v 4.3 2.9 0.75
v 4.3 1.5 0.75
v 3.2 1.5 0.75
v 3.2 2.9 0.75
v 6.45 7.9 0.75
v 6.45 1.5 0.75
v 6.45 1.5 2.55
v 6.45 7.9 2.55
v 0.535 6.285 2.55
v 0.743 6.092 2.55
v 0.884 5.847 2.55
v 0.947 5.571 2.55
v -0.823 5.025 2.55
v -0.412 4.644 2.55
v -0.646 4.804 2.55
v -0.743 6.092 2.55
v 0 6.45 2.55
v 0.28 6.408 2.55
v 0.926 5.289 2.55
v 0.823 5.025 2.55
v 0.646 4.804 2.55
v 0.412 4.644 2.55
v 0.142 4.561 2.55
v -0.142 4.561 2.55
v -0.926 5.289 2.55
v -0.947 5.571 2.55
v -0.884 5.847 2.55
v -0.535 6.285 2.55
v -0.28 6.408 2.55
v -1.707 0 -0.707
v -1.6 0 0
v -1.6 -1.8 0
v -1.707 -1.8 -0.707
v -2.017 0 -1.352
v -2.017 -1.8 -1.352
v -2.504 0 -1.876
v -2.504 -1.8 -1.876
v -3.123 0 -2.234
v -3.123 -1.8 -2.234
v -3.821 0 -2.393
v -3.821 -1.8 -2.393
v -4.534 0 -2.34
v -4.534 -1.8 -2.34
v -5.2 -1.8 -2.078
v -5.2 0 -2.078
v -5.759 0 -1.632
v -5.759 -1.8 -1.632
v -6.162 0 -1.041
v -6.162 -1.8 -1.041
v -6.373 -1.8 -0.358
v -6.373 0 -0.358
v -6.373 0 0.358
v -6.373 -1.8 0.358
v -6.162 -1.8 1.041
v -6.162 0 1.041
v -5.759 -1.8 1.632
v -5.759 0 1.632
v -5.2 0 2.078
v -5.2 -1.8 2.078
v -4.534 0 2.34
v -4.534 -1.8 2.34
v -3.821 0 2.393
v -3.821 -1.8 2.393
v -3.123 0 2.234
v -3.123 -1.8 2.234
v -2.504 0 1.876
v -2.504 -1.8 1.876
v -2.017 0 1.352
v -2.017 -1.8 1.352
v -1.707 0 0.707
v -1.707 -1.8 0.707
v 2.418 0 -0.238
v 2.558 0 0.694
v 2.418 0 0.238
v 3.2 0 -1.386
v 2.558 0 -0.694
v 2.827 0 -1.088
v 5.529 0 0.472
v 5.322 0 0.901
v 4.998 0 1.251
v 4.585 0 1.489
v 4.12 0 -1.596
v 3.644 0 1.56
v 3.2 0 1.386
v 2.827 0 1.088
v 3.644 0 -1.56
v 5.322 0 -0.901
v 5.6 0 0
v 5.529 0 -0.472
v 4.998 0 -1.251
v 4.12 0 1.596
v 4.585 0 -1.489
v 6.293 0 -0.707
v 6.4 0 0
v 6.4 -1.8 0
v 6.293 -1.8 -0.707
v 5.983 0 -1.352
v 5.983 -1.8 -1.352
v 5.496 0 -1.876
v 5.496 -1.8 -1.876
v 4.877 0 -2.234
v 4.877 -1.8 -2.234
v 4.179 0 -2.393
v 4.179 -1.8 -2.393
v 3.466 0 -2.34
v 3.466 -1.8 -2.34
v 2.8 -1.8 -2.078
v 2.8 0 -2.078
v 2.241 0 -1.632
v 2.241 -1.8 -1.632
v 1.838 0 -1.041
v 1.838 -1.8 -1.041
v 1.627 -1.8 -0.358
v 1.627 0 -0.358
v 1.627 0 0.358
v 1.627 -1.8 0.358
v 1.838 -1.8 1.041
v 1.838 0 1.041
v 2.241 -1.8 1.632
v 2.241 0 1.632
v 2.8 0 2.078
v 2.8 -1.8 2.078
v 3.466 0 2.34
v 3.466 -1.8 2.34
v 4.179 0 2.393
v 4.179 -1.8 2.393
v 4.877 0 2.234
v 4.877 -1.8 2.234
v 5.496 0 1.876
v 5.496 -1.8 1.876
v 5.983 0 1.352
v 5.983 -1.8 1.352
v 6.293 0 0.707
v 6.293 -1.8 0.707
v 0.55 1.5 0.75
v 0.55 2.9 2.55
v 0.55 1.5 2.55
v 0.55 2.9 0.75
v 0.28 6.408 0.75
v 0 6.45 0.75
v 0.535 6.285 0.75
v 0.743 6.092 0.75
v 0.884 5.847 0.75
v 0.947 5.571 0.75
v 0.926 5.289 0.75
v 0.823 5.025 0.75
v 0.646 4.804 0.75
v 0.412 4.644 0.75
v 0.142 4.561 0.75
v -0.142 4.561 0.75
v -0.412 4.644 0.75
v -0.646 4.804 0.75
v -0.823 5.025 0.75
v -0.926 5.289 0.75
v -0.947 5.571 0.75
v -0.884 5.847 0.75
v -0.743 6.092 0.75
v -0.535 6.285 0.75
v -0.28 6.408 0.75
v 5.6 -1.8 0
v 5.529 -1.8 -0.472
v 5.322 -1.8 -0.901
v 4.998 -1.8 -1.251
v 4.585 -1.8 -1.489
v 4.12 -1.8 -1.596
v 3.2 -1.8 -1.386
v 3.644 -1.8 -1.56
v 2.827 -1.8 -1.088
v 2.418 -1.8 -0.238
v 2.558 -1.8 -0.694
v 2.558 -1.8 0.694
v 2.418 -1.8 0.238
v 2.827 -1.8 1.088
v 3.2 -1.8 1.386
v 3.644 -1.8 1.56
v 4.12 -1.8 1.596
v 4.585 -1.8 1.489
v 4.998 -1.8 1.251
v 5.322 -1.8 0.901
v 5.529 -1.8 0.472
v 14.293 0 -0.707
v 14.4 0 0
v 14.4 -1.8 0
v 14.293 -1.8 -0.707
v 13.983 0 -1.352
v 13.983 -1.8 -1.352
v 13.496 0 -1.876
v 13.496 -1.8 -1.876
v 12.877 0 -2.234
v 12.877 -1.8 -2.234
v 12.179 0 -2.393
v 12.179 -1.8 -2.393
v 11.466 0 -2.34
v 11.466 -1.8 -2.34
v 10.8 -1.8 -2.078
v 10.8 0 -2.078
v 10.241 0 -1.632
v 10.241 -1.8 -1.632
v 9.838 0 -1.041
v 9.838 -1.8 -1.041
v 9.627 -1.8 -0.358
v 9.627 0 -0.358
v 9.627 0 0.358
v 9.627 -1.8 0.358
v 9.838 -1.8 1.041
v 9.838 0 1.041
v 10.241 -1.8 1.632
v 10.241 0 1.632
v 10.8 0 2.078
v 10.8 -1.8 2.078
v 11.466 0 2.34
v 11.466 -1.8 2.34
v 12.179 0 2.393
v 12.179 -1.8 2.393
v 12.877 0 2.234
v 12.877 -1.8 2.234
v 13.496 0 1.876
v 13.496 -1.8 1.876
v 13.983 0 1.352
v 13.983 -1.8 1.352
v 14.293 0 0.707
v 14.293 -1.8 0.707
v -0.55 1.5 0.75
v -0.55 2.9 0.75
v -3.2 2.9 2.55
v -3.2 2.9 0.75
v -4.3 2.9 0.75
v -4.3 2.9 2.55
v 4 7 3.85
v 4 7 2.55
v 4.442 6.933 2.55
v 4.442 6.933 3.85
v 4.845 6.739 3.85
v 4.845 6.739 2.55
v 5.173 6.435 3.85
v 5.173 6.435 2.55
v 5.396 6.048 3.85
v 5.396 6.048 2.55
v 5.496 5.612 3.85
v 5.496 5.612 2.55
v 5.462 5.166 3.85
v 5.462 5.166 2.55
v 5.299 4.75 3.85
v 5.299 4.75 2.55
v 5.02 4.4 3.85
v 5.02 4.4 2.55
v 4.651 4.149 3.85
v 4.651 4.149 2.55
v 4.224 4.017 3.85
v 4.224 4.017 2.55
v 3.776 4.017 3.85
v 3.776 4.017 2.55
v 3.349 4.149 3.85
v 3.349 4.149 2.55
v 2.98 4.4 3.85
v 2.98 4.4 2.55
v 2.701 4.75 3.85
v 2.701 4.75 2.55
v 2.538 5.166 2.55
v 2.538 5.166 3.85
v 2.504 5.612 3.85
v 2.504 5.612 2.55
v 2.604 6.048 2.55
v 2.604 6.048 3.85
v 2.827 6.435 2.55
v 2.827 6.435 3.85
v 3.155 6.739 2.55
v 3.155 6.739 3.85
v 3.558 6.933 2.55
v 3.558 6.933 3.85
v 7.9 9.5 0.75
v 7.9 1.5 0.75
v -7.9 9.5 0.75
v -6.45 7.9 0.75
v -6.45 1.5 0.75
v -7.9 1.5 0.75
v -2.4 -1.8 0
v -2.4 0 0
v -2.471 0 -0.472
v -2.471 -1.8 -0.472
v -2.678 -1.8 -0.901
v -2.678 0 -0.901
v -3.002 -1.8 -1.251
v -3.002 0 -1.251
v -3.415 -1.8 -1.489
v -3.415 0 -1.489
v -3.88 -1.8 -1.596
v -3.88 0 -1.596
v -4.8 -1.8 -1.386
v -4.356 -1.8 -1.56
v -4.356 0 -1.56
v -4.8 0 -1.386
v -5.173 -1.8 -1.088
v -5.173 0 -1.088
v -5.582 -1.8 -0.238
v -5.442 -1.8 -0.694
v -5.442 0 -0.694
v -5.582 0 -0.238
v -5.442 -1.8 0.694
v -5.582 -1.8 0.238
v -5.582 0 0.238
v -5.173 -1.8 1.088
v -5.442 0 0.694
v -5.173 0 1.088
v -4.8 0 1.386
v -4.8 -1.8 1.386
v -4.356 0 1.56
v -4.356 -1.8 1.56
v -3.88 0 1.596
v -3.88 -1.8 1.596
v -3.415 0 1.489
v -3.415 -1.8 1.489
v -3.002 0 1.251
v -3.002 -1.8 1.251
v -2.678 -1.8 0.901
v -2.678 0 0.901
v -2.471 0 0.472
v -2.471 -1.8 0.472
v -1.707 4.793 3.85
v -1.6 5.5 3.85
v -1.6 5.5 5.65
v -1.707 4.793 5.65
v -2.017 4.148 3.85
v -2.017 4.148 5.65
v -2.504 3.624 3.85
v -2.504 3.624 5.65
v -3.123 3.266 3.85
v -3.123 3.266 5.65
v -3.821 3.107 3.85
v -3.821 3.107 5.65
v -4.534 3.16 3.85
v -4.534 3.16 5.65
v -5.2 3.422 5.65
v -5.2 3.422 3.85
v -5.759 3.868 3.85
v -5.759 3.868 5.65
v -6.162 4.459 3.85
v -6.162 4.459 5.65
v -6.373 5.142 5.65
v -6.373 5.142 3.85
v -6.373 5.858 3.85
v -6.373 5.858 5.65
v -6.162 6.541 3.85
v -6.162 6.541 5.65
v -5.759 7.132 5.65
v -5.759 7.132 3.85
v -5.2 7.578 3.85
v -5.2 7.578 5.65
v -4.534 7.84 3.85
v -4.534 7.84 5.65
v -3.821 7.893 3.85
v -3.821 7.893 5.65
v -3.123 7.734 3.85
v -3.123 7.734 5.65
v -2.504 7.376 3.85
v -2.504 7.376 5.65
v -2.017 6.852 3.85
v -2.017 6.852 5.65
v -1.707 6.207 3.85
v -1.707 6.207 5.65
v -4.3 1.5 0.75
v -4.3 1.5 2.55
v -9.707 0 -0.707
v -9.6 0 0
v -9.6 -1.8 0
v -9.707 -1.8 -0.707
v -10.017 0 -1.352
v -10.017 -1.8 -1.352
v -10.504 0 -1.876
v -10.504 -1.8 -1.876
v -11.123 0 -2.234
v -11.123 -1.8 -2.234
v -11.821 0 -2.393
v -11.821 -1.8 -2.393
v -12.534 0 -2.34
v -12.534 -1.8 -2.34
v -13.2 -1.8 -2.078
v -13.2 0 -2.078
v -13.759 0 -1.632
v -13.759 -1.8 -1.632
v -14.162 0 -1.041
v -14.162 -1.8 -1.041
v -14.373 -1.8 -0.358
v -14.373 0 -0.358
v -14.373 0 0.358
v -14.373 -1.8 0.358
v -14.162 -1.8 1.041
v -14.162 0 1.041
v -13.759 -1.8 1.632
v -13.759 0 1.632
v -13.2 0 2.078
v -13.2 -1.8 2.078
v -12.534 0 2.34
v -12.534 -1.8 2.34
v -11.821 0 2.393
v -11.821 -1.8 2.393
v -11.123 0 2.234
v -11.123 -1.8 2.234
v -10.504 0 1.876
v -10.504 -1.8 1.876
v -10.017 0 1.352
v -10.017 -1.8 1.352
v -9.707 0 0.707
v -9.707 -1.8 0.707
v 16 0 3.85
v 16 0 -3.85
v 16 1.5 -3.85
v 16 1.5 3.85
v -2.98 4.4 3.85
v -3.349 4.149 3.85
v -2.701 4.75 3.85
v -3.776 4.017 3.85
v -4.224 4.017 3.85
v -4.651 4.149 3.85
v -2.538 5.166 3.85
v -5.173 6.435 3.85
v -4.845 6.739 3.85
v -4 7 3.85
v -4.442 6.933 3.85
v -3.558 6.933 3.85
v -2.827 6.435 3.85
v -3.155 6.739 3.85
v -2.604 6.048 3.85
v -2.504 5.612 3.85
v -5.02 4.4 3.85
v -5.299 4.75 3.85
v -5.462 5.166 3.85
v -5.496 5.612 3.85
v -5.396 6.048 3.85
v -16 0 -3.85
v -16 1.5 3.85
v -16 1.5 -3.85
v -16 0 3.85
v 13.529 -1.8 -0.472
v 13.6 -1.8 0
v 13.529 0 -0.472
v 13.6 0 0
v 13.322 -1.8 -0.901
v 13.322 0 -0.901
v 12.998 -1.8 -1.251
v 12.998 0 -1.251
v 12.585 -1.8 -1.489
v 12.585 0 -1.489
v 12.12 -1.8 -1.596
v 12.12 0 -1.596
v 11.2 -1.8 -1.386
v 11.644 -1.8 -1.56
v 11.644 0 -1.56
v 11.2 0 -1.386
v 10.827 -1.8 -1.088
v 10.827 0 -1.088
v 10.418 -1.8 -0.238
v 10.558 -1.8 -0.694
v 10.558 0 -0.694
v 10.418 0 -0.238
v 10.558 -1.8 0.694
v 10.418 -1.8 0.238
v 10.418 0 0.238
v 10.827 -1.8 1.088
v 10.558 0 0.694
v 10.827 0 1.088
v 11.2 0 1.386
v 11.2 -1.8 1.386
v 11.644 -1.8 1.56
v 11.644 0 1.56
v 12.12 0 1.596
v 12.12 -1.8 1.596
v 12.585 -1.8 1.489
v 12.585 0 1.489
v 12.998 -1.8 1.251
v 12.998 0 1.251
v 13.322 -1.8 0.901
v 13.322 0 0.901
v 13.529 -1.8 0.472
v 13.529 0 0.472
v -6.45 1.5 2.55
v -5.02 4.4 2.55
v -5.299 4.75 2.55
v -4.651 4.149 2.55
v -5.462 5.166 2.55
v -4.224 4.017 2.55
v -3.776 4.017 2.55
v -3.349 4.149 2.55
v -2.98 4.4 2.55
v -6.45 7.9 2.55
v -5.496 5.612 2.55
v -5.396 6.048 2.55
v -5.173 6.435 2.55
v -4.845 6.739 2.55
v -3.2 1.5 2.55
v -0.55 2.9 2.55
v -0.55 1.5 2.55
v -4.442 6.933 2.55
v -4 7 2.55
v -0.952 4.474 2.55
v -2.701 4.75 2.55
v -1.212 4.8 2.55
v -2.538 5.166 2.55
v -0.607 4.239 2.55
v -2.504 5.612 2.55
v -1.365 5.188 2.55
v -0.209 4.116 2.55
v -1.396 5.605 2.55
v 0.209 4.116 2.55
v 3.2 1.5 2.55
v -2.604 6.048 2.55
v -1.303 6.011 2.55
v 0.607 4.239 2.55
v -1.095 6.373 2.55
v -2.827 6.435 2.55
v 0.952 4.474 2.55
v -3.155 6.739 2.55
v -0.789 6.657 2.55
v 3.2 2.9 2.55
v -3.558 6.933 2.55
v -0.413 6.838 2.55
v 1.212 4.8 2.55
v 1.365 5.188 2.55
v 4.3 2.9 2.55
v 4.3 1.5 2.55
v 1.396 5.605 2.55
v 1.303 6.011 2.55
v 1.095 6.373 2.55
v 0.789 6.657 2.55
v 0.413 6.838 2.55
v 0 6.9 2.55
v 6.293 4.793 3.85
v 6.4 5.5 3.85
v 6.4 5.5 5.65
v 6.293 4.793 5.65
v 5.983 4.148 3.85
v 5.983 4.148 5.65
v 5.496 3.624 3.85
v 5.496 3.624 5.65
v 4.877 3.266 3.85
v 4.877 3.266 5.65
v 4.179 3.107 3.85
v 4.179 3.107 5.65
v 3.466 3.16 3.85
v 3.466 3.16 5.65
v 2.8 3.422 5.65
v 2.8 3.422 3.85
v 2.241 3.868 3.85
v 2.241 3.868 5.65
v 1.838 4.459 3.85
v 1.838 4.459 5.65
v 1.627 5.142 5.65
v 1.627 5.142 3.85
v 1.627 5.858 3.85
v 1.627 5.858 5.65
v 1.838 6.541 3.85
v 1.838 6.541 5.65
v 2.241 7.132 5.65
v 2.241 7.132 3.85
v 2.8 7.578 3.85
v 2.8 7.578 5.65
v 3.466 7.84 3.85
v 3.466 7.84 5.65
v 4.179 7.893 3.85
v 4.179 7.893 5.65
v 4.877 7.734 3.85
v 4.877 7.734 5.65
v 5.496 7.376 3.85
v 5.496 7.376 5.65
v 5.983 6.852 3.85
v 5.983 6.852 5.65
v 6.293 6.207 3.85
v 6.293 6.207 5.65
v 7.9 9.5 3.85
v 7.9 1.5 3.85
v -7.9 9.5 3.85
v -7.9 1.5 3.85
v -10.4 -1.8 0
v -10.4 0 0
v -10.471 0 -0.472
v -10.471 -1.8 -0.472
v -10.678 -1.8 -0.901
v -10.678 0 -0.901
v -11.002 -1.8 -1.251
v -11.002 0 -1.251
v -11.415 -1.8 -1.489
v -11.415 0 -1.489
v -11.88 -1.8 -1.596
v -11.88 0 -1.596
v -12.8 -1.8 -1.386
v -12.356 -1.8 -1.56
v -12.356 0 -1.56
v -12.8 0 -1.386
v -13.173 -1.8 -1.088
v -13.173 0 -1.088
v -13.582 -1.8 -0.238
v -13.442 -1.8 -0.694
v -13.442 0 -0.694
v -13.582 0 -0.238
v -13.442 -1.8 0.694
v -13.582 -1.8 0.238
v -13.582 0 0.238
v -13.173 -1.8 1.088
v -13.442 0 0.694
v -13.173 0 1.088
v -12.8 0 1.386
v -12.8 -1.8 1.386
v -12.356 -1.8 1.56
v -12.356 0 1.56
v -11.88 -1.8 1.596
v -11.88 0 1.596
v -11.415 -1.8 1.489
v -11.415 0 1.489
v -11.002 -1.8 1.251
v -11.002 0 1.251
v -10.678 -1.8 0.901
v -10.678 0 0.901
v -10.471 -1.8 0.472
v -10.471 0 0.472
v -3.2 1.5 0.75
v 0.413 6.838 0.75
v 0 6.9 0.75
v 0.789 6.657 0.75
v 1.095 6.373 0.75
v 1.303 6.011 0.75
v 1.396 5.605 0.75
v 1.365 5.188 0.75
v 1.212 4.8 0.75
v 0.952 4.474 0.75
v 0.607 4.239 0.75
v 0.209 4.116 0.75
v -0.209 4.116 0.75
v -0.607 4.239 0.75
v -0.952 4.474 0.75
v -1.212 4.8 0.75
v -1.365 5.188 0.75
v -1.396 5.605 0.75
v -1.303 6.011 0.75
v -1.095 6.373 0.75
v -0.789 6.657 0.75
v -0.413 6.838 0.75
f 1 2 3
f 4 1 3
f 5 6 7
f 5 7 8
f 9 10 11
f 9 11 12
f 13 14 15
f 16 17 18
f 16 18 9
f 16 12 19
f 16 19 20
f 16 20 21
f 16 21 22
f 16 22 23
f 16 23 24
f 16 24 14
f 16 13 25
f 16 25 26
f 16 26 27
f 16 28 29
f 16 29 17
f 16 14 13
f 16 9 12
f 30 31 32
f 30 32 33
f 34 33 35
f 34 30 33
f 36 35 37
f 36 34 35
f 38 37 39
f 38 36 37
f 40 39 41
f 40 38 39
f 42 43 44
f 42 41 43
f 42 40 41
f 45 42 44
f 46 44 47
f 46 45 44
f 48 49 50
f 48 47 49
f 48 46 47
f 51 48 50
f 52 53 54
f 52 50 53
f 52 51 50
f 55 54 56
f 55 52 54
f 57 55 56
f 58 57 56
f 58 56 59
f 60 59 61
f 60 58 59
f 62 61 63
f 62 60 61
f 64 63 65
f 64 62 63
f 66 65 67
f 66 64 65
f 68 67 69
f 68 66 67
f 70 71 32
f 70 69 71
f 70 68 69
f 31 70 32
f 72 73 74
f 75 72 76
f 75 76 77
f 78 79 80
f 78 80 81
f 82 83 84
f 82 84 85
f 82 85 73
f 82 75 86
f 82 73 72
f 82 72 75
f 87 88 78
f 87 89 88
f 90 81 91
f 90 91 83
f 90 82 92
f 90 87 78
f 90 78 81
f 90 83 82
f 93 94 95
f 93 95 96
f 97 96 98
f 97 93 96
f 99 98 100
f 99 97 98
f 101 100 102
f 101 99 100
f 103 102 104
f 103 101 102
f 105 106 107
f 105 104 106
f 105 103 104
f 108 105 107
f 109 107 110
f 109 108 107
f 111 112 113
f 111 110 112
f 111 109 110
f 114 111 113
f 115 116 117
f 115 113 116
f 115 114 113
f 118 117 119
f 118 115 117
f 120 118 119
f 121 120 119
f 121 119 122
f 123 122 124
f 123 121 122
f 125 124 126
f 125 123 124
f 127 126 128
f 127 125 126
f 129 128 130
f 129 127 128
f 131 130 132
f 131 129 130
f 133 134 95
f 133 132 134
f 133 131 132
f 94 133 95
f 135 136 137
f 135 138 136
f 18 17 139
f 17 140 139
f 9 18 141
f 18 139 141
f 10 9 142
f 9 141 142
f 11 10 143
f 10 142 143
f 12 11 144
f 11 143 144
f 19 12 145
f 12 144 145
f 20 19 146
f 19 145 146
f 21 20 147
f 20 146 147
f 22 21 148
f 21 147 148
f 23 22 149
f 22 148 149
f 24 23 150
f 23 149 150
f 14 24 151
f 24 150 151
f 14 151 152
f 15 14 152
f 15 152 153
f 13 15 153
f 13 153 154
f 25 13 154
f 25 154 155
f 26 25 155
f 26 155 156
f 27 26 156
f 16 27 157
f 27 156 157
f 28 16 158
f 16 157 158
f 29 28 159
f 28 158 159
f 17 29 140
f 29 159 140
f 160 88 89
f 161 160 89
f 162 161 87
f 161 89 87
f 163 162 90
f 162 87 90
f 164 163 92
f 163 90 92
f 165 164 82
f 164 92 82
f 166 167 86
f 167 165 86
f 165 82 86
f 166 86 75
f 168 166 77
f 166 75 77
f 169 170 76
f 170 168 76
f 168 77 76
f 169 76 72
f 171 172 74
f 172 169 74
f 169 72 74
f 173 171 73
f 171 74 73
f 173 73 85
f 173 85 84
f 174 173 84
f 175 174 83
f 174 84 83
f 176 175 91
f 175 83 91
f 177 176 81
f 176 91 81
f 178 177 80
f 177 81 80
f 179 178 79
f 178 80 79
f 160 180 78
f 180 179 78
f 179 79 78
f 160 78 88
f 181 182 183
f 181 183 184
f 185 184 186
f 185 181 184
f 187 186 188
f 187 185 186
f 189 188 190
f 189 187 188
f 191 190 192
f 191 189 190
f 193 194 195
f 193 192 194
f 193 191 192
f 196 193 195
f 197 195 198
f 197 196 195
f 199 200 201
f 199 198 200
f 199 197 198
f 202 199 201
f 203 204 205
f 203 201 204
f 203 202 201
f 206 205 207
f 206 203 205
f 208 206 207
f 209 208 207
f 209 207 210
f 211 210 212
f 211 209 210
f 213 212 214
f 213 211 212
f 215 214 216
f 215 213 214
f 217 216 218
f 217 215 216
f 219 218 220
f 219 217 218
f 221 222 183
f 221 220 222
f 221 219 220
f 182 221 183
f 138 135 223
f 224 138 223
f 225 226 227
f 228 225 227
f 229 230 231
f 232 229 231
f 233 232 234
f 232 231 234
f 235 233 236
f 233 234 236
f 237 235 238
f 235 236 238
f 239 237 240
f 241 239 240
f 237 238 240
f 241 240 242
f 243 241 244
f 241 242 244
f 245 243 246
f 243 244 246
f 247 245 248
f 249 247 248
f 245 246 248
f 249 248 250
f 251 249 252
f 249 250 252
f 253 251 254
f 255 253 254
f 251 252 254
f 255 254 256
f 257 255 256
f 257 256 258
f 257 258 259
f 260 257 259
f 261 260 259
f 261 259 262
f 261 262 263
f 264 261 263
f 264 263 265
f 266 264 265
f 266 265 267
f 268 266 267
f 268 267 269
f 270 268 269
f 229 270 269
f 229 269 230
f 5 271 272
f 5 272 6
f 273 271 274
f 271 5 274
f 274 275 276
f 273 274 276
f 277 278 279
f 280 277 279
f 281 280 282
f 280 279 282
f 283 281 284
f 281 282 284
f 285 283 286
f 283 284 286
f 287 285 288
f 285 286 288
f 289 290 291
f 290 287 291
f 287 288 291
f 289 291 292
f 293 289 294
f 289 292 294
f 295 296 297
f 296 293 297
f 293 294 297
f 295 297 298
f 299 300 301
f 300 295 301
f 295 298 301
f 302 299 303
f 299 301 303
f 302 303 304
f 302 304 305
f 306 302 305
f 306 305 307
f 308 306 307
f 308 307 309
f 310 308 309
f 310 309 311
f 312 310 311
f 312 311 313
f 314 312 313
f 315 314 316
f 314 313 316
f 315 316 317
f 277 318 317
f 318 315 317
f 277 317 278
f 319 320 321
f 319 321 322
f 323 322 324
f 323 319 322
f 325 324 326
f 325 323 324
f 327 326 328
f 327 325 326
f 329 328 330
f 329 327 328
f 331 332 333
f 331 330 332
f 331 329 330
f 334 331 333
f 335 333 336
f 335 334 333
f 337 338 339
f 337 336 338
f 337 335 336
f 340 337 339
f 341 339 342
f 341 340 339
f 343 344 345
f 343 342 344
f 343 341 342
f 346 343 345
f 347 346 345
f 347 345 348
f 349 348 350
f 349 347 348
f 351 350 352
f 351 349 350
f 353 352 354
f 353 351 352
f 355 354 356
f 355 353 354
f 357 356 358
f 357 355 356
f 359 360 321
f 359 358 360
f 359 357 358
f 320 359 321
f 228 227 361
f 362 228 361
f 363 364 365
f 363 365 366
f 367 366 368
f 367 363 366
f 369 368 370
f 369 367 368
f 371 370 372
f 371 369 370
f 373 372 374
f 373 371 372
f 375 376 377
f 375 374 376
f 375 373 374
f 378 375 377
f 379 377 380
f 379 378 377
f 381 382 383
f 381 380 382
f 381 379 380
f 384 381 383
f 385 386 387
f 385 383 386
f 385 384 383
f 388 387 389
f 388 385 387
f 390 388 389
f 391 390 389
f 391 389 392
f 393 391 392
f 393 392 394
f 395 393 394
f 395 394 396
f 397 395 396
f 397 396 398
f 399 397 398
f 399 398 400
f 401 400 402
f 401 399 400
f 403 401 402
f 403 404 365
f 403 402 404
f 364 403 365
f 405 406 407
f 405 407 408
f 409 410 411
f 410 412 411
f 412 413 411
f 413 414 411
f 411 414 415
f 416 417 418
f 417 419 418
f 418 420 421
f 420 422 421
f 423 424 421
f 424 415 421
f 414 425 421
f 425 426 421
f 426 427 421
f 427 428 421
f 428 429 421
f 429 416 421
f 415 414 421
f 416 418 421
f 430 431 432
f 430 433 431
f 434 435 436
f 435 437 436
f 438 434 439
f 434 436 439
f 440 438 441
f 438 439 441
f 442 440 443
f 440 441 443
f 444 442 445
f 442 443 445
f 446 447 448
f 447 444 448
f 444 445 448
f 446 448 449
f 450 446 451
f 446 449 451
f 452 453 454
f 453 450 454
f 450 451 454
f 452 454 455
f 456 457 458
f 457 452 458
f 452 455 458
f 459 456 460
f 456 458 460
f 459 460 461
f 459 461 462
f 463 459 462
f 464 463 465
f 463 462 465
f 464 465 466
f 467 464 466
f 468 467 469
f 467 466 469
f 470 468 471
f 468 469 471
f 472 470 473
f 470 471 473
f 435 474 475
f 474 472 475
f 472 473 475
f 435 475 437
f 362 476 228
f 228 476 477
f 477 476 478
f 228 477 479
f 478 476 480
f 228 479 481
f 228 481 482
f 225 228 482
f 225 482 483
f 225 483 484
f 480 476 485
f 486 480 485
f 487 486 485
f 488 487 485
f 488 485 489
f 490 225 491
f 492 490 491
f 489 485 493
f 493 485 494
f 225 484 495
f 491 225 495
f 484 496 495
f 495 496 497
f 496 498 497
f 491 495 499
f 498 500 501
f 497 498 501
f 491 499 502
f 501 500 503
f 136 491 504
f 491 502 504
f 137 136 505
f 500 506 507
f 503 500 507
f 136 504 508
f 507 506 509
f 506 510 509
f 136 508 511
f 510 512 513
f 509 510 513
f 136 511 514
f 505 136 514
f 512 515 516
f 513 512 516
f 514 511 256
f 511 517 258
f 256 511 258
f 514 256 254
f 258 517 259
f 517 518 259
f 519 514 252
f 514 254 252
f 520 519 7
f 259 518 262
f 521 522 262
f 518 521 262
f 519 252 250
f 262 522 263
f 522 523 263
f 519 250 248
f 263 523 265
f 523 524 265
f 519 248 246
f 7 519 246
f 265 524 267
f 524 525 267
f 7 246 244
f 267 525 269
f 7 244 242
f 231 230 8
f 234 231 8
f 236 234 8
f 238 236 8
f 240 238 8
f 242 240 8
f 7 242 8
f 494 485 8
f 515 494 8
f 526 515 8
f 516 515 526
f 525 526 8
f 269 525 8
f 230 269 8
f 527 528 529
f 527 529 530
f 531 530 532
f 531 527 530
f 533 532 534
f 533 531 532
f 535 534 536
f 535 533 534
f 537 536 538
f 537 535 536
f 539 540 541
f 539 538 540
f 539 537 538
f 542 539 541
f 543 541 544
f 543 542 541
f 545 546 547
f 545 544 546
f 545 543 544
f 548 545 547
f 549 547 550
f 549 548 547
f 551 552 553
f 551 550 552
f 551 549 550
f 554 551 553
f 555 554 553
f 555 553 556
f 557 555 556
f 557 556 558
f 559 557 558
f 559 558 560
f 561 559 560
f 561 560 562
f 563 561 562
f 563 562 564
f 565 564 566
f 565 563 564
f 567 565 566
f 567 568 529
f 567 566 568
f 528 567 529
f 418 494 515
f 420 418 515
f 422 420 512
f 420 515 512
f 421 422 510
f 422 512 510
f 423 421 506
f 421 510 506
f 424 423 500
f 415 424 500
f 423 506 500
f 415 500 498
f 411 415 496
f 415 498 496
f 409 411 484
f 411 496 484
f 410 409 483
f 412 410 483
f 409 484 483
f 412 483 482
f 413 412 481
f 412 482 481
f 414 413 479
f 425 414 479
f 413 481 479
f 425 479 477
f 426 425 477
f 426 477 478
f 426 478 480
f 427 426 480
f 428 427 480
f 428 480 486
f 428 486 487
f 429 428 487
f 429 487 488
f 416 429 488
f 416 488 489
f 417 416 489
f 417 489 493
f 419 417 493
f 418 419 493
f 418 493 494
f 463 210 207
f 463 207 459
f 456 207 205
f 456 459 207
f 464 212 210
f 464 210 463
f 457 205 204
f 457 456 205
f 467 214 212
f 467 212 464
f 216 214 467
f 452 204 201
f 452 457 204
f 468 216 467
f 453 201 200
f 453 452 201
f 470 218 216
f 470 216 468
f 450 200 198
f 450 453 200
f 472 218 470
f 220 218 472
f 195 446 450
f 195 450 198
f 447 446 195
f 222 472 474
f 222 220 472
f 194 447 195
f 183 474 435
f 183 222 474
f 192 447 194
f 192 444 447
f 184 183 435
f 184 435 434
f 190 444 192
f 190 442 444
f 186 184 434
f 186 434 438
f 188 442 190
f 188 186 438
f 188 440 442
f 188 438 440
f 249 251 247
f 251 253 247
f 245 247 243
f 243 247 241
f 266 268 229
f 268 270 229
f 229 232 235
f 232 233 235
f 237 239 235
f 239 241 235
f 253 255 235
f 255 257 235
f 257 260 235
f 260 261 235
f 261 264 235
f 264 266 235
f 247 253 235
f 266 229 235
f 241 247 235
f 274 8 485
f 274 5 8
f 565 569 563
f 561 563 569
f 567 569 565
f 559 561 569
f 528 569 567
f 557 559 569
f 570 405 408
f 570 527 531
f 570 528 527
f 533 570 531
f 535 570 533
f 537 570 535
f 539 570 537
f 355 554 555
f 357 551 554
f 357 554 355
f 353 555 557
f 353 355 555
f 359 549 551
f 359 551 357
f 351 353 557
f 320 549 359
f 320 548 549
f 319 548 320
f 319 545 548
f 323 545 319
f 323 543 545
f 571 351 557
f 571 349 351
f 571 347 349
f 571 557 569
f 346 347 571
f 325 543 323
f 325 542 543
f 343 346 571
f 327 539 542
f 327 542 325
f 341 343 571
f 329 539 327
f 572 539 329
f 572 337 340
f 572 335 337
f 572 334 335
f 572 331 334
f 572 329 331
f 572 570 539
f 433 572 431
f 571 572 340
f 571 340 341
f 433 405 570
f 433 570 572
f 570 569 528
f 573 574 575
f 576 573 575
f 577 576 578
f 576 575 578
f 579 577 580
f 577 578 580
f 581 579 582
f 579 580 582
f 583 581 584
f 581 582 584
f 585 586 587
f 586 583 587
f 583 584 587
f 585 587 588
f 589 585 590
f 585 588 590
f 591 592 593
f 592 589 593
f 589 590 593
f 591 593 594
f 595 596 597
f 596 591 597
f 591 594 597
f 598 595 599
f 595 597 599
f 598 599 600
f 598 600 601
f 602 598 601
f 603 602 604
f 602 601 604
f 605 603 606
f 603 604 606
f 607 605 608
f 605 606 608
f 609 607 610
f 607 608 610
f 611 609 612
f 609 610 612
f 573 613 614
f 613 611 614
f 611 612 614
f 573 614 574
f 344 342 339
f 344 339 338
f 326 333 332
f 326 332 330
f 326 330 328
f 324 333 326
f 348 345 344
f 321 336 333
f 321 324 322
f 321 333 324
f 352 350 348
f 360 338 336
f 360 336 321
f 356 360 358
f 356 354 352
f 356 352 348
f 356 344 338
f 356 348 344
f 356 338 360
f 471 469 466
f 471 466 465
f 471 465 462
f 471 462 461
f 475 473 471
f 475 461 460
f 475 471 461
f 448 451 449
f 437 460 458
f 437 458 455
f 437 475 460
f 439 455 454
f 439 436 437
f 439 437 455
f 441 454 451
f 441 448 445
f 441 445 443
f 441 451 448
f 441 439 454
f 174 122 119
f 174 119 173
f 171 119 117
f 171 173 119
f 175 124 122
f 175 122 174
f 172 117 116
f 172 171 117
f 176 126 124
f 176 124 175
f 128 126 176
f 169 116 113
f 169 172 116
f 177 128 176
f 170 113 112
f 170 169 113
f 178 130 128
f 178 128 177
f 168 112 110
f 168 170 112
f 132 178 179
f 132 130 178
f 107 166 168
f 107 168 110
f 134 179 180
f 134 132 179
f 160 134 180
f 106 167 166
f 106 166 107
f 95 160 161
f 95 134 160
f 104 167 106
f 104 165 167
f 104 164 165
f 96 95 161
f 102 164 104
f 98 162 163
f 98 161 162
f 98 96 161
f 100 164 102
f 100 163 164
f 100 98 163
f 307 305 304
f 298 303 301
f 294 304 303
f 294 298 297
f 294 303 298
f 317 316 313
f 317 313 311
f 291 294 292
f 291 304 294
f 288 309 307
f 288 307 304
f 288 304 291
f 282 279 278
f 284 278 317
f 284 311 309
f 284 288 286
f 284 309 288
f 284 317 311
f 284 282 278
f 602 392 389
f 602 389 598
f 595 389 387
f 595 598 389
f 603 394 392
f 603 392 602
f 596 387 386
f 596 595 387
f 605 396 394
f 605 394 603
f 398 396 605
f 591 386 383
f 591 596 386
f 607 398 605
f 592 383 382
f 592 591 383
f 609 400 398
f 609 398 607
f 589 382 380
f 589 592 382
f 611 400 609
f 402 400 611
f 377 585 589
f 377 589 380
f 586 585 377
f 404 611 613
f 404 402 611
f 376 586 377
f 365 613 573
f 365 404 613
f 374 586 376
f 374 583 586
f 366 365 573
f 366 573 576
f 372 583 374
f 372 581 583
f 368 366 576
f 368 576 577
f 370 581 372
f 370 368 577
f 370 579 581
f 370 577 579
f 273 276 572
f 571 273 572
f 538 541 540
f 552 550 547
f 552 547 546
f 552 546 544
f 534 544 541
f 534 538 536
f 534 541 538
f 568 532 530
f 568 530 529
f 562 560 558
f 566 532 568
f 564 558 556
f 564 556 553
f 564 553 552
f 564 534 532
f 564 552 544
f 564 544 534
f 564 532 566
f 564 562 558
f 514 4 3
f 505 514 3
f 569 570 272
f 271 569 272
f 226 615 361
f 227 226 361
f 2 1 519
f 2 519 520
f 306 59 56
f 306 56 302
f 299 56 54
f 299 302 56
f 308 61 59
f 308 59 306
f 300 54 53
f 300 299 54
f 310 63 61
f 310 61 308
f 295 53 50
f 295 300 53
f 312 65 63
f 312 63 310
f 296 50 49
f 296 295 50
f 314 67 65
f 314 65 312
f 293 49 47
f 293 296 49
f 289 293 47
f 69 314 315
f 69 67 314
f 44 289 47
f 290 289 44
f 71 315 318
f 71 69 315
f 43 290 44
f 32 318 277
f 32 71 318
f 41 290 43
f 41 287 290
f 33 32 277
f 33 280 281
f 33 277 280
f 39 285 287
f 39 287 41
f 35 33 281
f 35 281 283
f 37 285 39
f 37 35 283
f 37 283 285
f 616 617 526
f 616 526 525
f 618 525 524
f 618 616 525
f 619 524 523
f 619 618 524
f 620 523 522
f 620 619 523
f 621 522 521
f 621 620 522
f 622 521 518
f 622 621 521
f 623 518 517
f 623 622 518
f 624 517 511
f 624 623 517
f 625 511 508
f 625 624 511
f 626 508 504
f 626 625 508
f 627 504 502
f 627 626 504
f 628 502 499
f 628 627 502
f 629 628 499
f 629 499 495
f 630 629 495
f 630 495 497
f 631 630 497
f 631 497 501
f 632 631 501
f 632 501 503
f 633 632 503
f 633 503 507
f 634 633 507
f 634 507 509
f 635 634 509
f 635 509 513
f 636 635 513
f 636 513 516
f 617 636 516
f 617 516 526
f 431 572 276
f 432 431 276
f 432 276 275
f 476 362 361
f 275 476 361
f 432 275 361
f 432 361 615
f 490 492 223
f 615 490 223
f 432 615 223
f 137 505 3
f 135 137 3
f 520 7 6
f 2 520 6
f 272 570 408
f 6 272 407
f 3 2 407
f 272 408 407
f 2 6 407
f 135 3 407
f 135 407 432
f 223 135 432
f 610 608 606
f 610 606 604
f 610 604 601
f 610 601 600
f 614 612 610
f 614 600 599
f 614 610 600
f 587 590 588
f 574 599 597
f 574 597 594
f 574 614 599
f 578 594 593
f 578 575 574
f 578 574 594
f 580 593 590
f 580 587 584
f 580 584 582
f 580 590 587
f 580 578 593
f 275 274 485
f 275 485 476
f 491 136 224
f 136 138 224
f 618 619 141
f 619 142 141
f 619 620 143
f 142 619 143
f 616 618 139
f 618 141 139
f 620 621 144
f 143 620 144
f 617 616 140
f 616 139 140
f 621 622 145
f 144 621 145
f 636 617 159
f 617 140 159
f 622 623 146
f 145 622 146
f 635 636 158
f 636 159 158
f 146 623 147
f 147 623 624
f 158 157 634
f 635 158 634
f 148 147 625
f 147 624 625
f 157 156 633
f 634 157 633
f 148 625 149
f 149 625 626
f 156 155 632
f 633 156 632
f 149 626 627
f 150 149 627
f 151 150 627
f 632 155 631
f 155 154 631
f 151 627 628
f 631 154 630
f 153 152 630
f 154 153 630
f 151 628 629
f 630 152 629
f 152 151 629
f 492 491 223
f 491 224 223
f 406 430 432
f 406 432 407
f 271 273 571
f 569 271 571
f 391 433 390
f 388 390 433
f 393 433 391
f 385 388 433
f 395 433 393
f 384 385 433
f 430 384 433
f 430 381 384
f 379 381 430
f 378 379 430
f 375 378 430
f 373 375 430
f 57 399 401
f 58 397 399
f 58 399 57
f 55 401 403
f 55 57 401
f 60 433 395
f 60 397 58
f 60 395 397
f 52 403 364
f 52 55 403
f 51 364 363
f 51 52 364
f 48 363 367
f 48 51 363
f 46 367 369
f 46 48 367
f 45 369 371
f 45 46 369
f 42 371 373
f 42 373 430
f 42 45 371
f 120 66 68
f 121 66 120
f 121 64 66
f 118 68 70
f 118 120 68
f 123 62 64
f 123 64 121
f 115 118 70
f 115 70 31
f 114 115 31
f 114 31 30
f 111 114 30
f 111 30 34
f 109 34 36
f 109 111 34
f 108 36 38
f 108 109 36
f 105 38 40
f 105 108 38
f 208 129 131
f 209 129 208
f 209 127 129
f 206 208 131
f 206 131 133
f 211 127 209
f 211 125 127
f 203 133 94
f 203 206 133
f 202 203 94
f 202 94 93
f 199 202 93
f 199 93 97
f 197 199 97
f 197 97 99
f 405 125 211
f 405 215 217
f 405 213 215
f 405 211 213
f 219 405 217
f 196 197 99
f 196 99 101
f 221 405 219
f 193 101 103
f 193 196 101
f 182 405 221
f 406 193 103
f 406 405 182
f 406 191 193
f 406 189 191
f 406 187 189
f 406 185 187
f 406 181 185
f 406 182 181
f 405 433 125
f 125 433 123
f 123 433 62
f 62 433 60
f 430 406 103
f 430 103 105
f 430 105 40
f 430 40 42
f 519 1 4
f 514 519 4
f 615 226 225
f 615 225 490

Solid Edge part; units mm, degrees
sketch "Sketch1" plane through (0, 0, 0) normal (0, -1, 0) x (1, 0, 0)
  line L0 (-16, -3.85) -> (16, -3.85)
  line L1 (16, -3.85) -> (16, 3.85)
  line L2 (16, 3.85) -> (-16, 3.85)
  line L3 (-16, 3.85) -> (-16, -3.85)
  dimension "D1" = 32
  dimension "D2" = 7.7
extrude "Protrusion1" add sketch "Sketch1" against normal blind 1.5
sketch "Sketch2" plane through (0, 1.5, 0) normal (0, 1, 0) x (-1, 0, 0)
  line L0 (7.9, 3.85) -> (-7.9, 3.85)
  line L1 (-7.9, 3.85) -> (-7.9, 0.75)
  line L2 (-7.9, 0.75) -> (7.9, 0.75)
  line L3 (7.9, 0.75) -> (7.9, 3.85)
  dimension "D1" = 15.8
  dimension "D2" = 3.1
extrude "ExtrudedProtrusion_2" add sketch "Sketch2" along normal blind 8
sketch "Sketch3" plane through (0, 5.5, 0.75) normal (0, 0, -1) x (0, 1, 0)
  line L0 (2.4, -6.45) -> (-4, -6.45)
  line L1 (-4, -6.45) -> (-4, -4.3)
  line L2 (-2.6, -4.3) -> (-4, -4.3)
  line L3 (-2.6, -3.2) -> (-2.6, -4.3)
  line L4 (-2.6, -3.2) -> (-4, -3.2)
  line L5 (-4, -3.2) -> (-4, -0.55)
  line L6 (-2.6, -0.55) -> (-4, -0.55)
  line L7 (-2.6, 0.55) -> (-2.6, -0.55)
  line L8 (-2.6, 0.55) -> (-4, 0.55)
  line L9 (-4, 0.55) -> (-4, 3.2)
  line L10 (-2.6, 3.2) -> (-4, 3.2)
  line L11 (-2.6, 4.3) -> (-2.6, 3.2)
  line L12 (-2.6, 4.3) -> (-4, 4.3)
  line L13 (-4, 4.3) -> (-4, 6.45)
  line L14 (-4, 6.45) -> (2.4, 6.45)
  line L15 (2.4, 6.45) -> (2.4, -6.45)
  circle A0 centre (0, 0) radius 1.4
  circle A1 centre (0, 0) radius 0.95
  dimension "D1" = 2.8
  dimension "D2" = 1.9
  dimension "D3" = 1.1
  dimension "D4" = 1.1
  dimension "D5" = 1.1
extrude "ExtrudedCutout_1" cut sketch "Sketch3" against normal blind 1.8
sketch "Sketch4" plane through (0, 4.7, 2.55) normal (0, 0, -1) x (0, 1, 0)
  circle A0 centre (0.8, 4) radius 1.5
  circle A1 centre (0.8, -4) radius 1.5
  dimension "D1" = 3
  dimension "D2" = 3
extrude "ExtrudedCutout_2" cut sketch "Sketch4" against normal blind 2.4
sketch "Sketch5" plane through (0, 4.75, 3.85) normal (0, 0, 1) x (1, 0, 0)
  circle A0 centre (-4, 0.75) radius 2.4
  circle A1 centre (4, 0.75) radius 2.4
  dimension "D1" = 4.8
  dimension "D2" = 4.8
extrude "ExtrudedProtrusion_3" add sketch "Sketch5" along normal blind 1.8
sketch "Sketch6" plane through (0, 0, 0) normal (0, -1, 0) x (1, 0, 0)
  circle A0 centre (-12, 0) radius 2.4
  circle A1 centre (-4, 0) radius 2.4
  circle A2 centre (4, 0) radius 2.4
  circle A3 centre (12, 0) radius 2.4
  circle A4 centre (-12, 0) radius 1.6
  circle A5 centre (-4, 0) radius 1.6
  circle A6 centre (4, 0) radius 1.6
  circle A7 centre (12, 0) radius 1.6
  dimension "D1" = 4.8
  dimension "D2" = 4.8
  dimension "D3" = 4.8
  dimension "D4" = 4.8
  dimension "D5" = 3.2
  dimension "D6" = 3.2
  dimension "D7" = 3.2
  dimension "D8" = 3.2
extrude "ExtrudedProtrusion_4" add sketch "Sketch6" along normal blind 1.8
